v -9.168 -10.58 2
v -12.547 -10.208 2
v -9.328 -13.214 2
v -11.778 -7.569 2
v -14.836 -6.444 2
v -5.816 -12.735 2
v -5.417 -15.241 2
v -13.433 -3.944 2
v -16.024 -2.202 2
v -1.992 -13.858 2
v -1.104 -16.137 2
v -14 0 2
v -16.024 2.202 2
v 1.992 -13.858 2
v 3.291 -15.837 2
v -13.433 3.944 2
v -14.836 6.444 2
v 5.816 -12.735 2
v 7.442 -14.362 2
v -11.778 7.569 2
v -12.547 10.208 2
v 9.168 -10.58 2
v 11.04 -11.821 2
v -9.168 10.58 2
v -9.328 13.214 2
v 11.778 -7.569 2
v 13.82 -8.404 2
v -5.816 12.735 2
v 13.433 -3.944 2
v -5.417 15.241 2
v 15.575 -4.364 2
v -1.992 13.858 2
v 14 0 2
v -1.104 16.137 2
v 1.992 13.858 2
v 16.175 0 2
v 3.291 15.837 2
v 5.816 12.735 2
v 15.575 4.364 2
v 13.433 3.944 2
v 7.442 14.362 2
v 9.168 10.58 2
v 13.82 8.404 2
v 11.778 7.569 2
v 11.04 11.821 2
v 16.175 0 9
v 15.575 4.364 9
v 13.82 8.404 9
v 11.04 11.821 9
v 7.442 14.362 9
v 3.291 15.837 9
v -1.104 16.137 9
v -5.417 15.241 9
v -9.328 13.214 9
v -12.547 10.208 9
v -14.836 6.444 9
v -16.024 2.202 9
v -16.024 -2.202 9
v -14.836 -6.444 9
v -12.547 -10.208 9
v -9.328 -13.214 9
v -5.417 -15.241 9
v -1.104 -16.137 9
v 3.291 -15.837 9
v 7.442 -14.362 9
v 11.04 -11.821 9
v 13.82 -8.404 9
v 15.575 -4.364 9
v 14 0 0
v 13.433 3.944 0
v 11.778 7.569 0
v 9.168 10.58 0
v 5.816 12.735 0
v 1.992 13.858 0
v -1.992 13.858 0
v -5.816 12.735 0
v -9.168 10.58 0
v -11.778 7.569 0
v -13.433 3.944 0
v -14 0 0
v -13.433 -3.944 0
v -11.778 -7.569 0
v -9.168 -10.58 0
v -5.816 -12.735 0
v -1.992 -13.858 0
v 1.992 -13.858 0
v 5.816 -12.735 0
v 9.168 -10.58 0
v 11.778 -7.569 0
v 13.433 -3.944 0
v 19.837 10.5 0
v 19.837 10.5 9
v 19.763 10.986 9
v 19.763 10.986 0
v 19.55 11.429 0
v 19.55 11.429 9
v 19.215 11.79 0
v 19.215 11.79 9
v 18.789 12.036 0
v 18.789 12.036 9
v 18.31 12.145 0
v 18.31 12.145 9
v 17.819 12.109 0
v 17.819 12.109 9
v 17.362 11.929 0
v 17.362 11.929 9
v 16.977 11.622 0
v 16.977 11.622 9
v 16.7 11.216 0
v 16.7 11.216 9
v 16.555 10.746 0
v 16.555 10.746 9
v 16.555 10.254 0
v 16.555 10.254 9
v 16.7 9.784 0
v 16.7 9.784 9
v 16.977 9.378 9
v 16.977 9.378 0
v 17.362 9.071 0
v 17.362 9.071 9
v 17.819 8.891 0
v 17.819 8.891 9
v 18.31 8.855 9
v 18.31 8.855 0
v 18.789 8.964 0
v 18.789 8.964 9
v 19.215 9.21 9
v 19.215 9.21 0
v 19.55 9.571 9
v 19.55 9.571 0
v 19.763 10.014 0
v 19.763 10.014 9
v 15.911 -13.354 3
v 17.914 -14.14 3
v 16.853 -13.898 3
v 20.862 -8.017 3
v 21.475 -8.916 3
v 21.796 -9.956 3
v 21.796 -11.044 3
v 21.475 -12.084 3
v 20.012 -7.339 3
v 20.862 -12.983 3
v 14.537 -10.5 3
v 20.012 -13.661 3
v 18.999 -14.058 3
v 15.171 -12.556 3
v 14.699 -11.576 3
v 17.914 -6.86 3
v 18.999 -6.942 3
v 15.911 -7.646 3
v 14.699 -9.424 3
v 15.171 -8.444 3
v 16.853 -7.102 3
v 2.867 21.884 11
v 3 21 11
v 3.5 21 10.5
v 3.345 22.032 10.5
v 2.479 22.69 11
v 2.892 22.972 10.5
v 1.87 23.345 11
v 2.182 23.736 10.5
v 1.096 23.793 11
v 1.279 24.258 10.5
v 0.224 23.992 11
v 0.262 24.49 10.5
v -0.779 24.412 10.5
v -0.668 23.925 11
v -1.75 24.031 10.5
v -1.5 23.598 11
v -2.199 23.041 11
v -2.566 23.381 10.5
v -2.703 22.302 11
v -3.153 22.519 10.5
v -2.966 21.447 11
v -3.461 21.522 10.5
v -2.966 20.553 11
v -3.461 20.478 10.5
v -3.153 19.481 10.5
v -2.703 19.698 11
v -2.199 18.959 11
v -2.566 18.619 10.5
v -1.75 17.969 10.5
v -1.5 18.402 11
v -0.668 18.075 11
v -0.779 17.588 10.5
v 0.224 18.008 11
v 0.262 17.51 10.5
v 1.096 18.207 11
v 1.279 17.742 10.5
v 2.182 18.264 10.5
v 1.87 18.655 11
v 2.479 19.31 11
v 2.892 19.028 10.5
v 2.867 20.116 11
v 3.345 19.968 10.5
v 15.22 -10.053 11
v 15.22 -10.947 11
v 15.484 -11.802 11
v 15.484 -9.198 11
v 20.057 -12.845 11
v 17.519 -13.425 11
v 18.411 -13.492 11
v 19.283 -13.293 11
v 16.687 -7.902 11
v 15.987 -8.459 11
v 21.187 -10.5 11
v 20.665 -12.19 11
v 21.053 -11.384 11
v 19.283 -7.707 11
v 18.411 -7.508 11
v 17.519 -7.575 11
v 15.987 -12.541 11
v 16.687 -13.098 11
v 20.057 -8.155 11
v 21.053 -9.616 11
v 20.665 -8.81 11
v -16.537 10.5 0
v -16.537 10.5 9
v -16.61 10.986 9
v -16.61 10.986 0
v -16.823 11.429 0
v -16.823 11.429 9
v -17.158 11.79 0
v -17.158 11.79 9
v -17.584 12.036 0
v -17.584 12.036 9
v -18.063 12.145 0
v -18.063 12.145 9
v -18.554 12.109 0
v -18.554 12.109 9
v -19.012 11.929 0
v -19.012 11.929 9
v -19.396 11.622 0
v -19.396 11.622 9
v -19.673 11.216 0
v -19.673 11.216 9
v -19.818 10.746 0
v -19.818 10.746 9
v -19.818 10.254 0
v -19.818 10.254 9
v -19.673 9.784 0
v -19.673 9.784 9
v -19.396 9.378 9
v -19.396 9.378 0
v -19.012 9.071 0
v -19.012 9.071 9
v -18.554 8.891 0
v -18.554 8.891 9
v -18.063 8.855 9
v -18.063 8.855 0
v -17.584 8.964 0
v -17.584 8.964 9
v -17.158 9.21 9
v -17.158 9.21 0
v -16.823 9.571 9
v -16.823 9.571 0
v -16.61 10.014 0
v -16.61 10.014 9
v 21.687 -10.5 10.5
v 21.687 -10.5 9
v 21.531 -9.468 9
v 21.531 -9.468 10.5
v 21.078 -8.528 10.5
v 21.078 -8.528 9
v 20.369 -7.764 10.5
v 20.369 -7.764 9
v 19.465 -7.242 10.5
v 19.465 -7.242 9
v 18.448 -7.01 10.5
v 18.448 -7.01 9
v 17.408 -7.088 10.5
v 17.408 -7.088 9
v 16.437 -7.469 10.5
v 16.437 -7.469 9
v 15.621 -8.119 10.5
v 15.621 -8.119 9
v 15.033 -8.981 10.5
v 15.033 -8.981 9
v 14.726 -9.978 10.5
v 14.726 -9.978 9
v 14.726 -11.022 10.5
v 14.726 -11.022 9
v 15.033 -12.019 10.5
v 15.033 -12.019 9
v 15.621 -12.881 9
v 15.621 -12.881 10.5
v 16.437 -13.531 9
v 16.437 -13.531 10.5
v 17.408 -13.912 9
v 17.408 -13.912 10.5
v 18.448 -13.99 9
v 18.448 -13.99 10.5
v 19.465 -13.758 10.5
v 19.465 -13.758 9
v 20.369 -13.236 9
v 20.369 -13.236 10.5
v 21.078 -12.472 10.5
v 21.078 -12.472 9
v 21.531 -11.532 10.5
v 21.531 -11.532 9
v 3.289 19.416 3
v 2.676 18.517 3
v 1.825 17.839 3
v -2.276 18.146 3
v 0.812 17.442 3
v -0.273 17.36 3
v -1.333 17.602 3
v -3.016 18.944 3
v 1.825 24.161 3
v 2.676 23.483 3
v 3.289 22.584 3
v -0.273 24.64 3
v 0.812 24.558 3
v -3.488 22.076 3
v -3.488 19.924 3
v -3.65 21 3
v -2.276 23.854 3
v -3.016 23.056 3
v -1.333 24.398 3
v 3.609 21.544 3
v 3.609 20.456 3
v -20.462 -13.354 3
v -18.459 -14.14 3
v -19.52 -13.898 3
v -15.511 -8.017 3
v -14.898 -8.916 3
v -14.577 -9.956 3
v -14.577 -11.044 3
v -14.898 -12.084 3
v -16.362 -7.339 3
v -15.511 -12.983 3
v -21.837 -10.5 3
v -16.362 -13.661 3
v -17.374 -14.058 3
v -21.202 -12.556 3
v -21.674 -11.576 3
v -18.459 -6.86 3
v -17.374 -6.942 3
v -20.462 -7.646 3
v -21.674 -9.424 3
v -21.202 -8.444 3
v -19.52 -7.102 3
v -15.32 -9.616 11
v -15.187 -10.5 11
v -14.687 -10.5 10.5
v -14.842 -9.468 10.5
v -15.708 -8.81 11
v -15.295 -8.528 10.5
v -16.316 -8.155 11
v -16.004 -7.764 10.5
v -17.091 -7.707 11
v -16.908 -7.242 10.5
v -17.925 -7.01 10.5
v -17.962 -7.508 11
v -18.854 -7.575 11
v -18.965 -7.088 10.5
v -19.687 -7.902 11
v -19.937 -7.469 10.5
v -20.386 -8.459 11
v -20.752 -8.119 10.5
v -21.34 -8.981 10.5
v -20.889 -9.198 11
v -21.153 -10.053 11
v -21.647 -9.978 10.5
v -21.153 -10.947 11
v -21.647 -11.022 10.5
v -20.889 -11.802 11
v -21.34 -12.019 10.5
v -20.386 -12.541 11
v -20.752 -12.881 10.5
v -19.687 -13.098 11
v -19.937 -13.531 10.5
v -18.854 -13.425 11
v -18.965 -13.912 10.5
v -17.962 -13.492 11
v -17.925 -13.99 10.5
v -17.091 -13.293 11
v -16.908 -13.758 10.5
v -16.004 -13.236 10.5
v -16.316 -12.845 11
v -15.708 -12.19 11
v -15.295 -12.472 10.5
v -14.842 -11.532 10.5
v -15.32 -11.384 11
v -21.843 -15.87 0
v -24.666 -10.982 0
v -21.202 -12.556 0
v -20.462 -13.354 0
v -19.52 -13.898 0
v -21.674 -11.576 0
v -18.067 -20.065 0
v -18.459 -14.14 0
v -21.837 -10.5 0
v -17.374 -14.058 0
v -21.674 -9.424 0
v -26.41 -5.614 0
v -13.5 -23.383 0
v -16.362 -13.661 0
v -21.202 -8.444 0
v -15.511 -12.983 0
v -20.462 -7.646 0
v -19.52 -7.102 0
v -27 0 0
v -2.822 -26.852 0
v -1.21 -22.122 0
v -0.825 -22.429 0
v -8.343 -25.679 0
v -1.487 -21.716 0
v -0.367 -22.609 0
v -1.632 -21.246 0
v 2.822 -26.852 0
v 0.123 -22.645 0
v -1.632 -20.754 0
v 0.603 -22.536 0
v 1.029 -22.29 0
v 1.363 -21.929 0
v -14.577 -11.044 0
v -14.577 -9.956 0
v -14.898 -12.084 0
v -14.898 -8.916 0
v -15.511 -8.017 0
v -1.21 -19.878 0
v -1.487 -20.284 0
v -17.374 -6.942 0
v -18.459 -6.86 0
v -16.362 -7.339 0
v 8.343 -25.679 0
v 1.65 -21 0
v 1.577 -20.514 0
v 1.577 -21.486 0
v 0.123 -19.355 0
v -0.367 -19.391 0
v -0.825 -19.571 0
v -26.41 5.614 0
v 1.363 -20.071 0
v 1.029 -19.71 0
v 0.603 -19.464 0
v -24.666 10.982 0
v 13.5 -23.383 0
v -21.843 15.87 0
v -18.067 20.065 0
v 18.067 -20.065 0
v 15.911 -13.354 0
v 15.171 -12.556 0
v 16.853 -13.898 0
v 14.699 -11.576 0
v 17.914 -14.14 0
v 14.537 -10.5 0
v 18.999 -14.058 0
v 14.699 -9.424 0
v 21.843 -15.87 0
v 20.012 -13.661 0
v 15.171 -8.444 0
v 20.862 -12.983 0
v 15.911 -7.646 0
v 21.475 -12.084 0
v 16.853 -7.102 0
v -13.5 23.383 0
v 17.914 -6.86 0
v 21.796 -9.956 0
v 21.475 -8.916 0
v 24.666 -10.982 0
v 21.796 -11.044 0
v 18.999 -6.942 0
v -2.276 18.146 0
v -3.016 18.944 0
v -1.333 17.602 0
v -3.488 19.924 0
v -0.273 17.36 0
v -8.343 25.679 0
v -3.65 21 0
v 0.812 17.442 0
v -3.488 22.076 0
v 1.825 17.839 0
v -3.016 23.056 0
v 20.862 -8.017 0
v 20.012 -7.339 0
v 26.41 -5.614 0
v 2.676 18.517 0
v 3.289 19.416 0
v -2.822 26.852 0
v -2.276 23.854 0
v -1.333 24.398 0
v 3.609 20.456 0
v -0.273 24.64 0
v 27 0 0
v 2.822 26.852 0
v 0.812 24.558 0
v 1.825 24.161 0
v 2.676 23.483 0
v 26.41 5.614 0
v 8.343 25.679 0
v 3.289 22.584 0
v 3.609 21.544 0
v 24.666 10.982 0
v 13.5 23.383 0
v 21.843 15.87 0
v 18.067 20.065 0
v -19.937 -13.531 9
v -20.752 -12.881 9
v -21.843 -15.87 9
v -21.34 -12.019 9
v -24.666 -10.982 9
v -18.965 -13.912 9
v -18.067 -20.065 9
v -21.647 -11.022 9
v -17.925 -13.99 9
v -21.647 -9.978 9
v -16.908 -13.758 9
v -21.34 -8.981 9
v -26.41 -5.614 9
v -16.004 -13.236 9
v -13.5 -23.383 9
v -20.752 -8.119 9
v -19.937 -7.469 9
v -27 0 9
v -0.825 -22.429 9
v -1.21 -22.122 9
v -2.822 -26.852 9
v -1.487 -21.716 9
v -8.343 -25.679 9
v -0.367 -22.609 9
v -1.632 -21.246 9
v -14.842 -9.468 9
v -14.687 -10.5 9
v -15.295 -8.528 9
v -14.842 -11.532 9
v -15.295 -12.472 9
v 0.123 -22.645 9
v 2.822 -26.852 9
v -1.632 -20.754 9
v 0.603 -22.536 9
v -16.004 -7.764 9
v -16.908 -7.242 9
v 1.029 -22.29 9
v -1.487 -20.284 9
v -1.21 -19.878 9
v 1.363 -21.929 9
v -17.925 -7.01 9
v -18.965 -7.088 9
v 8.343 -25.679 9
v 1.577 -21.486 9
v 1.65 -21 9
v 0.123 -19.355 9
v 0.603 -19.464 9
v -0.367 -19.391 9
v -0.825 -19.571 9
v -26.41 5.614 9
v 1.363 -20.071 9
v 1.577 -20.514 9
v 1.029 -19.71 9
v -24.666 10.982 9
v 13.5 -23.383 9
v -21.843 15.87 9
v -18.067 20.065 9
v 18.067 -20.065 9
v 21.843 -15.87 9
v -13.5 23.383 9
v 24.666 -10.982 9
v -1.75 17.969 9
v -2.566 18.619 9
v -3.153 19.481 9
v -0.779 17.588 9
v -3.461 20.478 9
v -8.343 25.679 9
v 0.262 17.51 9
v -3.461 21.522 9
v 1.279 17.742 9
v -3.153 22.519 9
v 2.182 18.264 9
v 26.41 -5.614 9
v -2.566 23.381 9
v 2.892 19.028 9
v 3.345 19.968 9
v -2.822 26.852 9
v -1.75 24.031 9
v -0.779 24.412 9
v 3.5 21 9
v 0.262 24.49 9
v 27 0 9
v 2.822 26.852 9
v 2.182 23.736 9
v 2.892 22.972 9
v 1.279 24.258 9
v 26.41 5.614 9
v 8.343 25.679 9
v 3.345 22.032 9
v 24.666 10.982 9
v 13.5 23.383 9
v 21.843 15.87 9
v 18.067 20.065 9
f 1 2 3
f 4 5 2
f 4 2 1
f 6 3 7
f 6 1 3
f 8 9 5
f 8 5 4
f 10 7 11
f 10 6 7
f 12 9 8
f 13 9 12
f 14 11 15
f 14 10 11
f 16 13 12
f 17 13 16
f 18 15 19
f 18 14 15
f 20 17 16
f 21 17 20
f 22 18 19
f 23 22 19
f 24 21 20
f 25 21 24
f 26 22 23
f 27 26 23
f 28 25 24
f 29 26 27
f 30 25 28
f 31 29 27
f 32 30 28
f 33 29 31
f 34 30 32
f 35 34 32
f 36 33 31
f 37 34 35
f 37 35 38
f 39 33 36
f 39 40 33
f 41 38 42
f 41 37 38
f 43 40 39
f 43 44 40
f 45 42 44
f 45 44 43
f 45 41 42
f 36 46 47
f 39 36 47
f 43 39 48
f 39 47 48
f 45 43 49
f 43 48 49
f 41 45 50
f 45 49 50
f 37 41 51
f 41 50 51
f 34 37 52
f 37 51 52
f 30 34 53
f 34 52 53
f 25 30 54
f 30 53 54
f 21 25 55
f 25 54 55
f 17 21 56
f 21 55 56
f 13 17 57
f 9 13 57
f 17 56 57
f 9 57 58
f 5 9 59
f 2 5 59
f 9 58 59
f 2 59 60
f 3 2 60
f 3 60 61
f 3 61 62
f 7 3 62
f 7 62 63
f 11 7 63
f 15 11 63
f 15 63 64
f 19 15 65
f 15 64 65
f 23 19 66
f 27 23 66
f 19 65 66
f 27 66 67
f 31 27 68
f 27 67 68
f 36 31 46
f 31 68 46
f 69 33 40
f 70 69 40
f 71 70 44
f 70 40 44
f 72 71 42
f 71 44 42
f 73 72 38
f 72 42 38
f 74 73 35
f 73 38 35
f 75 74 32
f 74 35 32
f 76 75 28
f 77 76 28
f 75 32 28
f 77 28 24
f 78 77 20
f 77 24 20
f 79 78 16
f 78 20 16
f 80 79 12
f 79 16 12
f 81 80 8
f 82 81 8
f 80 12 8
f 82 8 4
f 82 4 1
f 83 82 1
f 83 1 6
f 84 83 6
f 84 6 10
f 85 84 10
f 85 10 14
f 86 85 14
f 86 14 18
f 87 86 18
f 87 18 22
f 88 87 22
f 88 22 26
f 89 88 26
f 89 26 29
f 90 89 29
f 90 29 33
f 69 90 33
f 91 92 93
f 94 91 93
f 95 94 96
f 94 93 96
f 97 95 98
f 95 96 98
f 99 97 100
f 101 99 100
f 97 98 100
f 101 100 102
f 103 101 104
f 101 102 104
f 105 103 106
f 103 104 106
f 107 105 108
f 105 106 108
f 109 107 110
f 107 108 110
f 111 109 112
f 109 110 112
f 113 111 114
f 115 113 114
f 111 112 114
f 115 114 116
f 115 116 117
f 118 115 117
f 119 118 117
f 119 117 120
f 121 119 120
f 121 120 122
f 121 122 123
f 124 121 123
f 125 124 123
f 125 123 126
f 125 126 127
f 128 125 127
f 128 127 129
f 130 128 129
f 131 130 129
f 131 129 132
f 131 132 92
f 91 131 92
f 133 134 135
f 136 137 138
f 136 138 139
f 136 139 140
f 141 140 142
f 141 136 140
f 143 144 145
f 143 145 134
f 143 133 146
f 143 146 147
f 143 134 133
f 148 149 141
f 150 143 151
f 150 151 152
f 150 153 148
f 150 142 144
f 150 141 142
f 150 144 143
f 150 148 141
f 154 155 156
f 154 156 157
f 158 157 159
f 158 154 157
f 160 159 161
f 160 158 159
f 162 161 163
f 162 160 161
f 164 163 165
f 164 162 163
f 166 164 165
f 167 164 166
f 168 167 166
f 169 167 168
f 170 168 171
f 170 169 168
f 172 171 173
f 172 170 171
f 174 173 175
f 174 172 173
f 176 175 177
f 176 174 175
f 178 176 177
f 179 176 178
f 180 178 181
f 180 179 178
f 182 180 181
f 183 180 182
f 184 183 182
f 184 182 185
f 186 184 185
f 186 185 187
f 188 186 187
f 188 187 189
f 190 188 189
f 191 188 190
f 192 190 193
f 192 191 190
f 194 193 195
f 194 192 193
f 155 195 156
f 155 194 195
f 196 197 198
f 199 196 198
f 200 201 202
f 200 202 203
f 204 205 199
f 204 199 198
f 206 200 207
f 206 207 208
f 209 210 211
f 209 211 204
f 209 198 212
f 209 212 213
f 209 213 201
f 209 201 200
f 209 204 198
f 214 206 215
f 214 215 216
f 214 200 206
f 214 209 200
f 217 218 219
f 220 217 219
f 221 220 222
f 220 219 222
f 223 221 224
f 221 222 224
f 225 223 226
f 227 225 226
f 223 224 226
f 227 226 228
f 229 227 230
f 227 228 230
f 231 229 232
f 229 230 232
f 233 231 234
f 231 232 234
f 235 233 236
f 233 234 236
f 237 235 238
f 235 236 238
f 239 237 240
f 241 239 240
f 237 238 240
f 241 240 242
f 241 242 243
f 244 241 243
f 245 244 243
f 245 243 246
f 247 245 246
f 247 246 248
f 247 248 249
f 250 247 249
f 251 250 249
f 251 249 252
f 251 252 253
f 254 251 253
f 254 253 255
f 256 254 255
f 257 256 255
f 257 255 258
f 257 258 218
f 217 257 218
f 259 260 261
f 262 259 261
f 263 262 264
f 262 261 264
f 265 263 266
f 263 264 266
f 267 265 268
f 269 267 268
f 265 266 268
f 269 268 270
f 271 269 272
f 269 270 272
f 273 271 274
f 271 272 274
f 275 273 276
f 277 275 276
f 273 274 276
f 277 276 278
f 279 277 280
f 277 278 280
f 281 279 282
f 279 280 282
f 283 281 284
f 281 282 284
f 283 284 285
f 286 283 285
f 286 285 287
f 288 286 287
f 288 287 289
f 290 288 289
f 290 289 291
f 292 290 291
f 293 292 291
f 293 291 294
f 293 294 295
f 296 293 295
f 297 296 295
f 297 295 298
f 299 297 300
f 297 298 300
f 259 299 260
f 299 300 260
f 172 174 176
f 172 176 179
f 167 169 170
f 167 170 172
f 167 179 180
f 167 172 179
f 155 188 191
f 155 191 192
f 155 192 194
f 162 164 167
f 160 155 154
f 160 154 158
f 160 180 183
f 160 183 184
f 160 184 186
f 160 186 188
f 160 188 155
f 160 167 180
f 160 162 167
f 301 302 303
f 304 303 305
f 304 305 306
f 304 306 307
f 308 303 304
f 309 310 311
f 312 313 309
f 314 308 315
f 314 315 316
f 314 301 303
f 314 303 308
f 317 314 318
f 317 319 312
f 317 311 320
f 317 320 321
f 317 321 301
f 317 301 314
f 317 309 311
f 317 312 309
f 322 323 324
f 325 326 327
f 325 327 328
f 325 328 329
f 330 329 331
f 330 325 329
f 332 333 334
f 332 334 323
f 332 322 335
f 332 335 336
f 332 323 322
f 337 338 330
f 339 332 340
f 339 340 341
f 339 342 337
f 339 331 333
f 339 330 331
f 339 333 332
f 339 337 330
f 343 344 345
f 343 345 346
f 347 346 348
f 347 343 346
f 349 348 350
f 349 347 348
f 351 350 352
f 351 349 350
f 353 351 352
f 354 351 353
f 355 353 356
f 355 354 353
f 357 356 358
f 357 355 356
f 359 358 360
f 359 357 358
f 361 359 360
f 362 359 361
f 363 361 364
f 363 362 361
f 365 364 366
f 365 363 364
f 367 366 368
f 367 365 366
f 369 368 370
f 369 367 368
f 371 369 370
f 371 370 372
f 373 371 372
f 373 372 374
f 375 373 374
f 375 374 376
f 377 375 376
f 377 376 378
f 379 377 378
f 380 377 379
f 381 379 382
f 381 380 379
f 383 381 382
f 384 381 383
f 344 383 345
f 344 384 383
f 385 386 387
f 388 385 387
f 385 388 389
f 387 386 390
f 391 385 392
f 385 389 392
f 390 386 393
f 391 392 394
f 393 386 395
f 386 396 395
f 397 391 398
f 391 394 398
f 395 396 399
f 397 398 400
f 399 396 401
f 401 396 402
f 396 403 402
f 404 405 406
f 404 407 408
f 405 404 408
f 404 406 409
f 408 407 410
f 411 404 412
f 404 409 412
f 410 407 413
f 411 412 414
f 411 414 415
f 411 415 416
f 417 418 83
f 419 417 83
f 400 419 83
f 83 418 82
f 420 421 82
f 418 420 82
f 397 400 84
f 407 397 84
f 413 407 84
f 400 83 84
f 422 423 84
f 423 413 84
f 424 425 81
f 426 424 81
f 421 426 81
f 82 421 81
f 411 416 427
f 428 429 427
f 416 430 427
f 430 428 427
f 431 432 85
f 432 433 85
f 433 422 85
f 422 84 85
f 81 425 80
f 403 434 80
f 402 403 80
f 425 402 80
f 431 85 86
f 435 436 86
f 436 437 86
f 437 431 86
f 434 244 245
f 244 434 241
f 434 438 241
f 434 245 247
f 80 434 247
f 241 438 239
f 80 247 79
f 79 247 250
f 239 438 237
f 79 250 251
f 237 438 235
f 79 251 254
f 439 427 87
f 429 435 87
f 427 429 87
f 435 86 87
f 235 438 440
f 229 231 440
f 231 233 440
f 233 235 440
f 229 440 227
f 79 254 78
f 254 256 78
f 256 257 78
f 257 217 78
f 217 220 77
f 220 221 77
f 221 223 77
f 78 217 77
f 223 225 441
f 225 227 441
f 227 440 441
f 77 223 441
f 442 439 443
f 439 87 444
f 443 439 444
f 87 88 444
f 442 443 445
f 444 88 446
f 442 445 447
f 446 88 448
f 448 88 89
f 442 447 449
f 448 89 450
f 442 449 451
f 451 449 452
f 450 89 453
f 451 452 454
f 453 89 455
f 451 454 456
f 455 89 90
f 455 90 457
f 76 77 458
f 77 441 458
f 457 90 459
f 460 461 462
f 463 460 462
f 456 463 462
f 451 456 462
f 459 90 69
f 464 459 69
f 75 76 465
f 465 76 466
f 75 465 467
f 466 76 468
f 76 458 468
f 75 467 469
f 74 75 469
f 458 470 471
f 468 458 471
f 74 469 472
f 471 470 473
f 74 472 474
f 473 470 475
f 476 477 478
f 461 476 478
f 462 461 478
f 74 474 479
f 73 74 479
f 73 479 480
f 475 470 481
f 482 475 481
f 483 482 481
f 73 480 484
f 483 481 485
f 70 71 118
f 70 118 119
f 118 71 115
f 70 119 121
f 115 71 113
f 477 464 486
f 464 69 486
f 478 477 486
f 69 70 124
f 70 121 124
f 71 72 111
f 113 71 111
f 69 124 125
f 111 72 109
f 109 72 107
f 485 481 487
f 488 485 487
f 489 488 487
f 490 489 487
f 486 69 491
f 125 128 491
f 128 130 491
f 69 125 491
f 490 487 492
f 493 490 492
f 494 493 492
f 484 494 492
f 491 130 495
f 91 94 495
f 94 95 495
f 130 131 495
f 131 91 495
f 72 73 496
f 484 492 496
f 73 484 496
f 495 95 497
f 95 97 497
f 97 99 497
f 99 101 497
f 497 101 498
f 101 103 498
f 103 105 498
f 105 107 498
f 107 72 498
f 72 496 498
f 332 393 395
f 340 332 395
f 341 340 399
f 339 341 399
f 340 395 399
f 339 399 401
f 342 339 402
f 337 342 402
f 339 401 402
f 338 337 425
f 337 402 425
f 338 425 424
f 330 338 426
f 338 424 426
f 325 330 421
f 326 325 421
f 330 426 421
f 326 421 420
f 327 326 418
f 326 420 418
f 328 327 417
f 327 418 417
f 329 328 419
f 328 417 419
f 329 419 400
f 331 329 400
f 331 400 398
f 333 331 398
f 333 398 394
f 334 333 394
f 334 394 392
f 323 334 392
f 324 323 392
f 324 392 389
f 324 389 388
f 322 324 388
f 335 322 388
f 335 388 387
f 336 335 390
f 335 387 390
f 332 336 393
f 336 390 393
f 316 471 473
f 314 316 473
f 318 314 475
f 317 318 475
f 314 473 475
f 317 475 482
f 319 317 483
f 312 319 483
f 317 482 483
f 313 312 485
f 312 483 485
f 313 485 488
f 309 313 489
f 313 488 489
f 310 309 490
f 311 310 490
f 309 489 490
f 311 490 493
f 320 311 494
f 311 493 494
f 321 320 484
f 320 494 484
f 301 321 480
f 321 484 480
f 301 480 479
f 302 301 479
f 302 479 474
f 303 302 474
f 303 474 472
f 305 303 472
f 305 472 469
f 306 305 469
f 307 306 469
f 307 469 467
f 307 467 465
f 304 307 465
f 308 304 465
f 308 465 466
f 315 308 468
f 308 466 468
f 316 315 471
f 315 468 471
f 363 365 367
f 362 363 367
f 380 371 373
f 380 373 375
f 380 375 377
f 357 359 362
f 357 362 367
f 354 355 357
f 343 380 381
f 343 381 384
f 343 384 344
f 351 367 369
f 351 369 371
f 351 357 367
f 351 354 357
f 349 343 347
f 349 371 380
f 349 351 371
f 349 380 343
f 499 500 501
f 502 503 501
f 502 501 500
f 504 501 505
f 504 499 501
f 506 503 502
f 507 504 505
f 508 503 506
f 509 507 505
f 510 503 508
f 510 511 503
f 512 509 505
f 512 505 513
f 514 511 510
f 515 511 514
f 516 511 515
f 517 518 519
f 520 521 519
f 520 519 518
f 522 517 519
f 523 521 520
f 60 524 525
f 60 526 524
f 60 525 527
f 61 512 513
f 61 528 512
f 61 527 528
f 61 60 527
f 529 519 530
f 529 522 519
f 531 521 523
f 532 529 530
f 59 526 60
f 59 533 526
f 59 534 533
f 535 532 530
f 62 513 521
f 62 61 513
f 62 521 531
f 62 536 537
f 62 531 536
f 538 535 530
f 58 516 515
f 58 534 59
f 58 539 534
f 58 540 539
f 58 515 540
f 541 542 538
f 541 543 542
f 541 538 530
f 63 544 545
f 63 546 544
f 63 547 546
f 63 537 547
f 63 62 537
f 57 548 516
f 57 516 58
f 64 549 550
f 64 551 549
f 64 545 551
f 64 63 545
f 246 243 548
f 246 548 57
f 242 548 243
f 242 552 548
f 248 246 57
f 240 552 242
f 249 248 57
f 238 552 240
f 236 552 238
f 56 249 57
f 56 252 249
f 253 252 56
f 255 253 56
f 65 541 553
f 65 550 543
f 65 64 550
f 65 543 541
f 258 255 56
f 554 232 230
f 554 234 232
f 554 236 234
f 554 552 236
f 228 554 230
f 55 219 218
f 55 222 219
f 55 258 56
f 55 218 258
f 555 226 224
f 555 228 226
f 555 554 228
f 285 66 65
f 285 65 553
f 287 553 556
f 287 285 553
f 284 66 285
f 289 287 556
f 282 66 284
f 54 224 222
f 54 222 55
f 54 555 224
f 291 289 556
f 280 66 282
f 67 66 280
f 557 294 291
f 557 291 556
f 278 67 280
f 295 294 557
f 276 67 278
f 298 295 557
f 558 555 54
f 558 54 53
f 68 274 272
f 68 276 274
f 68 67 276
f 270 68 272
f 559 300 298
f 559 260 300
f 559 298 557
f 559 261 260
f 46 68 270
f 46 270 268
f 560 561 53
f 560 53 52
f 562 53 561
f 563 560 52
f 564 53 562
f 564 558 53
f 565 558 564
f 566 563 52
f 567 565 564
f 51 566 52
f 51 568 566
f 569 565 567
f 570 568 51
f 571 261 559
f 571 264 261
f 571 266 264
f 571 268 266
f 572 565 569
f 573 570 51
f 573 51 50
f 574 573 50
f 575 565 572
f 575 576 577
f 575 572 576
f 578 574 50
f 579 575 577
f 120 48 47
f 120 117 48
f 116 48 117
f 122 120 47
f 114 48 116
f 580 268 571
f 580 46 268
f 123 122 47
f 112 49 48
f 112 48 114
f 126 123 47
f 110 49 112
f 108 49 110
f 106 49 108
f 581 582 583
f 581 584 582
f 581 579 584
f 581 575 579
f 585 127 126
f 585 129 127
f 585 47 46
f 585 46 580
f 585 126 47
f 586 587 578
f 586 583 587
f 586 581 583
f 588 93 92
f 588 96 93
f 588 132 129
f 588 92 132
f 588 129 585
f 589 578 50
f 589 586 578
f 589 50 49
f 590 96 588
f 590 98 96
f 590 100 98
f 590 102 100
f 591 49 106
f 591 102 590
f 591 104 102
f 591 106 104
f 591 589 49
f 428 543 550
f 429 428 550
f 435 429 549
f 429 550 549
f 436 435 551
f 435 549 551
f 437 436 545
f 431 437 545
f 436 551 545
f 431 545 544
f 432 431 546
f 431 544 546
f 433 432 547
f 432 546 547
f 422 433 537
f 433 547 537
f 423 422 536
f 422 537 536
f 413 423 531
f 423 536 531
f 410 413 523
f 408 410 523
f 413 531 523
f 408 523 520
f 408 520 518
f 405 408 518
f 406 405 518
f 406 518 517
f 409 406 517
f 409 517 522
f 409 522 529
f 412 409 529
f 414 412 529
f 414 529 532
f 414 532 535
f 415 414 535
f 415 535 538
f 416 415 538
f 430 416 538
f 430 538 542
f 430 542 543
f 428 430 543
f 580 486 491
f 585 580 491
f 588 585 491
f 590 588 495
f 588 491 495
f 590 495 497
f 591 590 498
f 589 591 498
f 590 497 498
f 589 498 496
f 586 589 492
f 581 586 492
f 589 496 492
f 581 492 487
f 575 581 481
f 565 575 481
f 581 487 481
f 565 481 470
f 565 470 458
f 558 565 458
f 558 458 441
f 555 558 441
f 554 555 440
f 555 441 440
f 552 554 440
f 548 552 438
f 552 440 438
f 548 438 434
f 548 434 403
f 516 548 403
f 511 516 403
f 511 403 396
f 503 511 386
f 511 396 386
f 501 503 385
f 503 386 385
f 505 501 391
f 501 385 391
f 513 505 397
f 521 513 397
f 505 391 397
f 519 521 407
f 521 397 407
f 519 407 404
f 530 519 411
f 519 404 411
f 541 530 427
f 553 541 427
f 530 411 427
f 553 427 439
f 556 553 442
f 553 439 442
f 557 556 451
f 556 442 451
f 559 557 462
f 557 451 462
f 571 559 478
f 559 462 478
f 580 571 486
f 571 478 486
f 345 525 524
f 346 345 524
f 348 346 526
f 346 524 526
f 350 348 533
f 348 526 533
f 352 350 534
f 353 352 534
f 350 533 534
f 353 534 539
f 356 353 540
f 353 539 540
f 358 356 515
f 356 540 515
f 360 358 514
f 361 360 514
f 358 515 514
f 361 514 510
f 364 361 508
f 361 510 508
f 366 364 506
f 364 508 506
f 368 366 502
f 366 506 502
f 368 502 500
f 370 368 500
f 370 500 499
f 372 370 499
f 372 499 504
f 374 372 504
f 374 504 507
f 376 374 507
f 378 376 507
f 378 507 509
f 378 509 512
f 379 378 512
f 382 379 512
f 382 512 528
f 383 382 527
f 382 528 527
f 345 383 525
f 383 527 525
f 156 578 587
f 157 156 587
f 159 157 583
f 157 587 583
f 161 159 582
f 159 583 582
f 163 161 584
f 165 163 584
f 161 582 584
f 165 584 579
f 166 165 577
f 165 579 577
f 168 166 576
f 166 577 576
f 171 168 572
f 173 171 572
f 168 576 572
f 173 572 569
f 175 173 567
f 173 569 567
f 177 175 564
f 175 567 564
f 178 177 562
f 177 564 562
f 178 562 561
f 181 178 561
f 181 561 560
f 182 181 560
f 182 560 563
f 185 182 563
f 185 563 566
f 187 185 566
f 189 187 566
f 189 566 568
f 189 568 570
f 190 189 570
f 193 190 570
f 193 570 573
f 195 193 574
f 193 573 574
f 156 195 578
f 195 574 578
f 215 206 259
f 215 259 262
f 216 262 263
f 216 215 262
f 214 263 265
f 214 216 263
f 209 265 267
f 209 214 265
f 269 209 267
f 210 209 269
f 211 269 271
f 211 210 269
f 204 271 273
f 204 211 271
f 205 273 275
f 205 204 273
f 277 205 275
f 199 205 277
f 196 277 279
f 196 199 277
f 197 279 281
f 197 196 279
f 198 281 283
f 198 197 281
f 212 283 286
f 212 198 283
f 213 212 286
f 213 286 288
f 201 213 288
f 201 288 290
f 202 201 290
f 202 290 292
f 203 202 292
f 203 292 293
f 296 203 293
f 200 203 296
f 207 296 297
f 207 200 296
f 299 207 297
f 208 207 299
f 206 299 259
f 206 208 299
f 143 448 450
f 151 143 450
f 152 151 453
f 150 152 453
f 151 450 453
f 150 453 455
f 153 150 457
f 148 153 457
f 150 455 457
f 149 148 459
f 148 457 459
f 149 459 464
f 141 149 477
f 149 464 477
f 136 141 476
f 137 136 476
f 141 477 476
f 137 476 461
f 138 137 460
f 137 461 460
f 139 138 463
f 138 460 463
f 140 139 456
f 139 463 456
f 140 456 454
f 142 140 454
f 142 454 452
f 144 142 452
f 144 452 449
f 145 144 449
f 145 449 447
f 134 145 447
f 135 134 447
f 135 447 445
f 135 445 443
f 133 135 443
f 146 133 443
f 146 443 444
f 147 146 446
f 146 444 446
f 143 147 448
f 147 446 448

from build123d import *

# Parameters (mm, degrees)
SKETCH_1_R            = 27
EXTRUDE_360_DEPTH     = 9
SKETCH_2_R            = 16.175
CUT_EXTRUDE_445_DEPTH = 7
SKETCH_3_R            = 14
CUT_EXTRUDE_528_DEPTH = 39.820097888
SKETCH_4_R            = 1.65
CUT_EXTRUDE_687_DEPTH = 40.230090492
SKETCH_6_R            = 3.65
CUT_EXTRUDE_894_DEPTH = 3
SKETCH_7_R            = 3.5
EXTRUDE_1085_DEPTH    = 2
CHAMFER_1_SIZE        = 0.5


with BuildPart() as part:
    # Эскиз1 → Extrude 360 (new body)
    with BuildSketch(Plane.XY):
        Circle(SKETCH_1_R)
    extrude(amount=EXTRUDE_360_DEPTH)

    # Эскиз2 → Cut-Extrude 445 (cut)
    with BuildSketch(Plane.XY.offset(9)):
        Circle(SKETCH_2_R)
    extrude(amount=-CUT_EXTRUDE_445_DEPTH, mode=Mode.SUBTRACT)

    # Эскиз3 → Cut-Extrude 528 (cut, through all)
    with BuildSketch(Plane.XY.offset(2)):
        Circle(SKETCH_3_R)
    extrude(amount=-CUT_EXTRUDE_528_DEPTH, mode=Mode.SUBTRACT)

    # Эскиз4 → Cut-Extrude 687 (cut, through all)
    with BuildSketch(Plane.XY.offset(9)):
        with Locations((-18.186533479, 10.5)):
            Circle(SKETCH_4_R)
        with Locations((18.186533479, 10.5)):
            Circle(SKETCH_4_R)
        with Locations((0, -21)):
            Circle(SKETCH_4_R)
    extrude(amount=-CUT_EXTRUDE_687_DEPTH, mode=Mode.SUBTRACT)

    # Эскиз6 → Cut-Extrude 894 (cut)
    with BuildSketch(Plane(origin=(0, 0, 0), x_dir=(-1, 0, 0), z_dir=(0, 0, -1))):
        with Locations((0, 21)):
            Circle(SKETCH_6_R)
        with Locations((-18.186533479, -10.5)):
            Circle(SKETCH_6_R)
        with Locations((18.186533479, -10.5)):
            Circle(SKETCH_6_R)
    extrude(amount=-CUT_EXTRUDE_894_DEPTH, mode=Mode.SUBTRACT)

    # Эскиз7 → Extrude 1085 (add)
    with BuildSketch(Plane.XY.offset(9)):
        with Locations((0, 21)):
            Circle(SKETCH_7_R)
        with Locations((-18.186533479, -10.5)):
            Circle(SKETCH_7_R)
        with Locations((18.186533479, -10.5)):
            Circle(SKETCH_7_R)
    extrude(amount=EXTRUDE_1085_DEPTH)

    # Фаска1
    chamfer_1_edges = [part.edges().sort_by_distance(p)[0] for p in [
        (-3.5, 21, 11),
        (-21.686533479, -10.5, 11),
        (14.686533479, -10.5, 11),
    ]]
    chamfer(chamfer_1_edges, length=CHAMFER_1_SIZE)


solid = part.part
